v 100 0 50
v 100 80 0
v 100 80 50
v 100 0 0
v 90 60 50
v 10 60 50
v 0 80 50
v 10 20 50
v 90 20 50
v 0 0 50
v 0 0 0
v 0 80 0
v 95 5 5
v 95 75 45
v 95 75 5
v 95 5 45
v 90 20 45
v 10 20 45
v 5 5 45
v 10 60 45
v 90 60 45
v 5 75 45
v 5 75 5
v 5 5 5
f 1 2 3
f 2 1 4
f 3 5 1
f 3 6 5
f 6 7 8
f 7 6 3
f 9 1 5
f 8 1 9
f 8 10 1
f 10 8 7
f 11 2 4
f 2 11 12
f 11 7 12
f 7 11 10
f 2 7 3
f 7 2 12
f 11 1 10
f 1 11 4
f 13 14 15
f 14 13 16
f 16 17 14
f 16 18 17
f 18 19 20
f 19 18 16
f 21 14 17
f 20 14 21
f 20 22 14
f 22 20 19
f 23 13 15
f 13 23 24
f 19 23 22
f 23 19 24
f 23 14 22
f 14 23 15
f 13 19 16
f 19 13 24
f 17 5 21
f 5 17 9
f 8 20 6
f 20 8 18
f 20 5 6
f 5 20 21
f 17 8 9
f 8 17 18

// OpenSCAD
// file: global.scad
// material
material_width = 5;

// rendering parameters
$fn=100;
// main file
include <global.scad>;

module box()
{
    // all measures im mm
    x = 100;
    y = 80;
    z = 50;

    // display measures
    d_x = 80;
    d_y = 40;

    difference()
    {
        // a block
        cube([x, y, z]);
        // remove the inside of the block
        translate([material_width, material_width, material_width])
            cube([x-2*material_width, y-2*material_width, z-2*material_width]);
        // make a window for the dislay
        translate([(x-d_x)/2, (y-d_y)/2, z-material_width])
            cube([d_x, d_y, material_width]);
    }
}

box();
